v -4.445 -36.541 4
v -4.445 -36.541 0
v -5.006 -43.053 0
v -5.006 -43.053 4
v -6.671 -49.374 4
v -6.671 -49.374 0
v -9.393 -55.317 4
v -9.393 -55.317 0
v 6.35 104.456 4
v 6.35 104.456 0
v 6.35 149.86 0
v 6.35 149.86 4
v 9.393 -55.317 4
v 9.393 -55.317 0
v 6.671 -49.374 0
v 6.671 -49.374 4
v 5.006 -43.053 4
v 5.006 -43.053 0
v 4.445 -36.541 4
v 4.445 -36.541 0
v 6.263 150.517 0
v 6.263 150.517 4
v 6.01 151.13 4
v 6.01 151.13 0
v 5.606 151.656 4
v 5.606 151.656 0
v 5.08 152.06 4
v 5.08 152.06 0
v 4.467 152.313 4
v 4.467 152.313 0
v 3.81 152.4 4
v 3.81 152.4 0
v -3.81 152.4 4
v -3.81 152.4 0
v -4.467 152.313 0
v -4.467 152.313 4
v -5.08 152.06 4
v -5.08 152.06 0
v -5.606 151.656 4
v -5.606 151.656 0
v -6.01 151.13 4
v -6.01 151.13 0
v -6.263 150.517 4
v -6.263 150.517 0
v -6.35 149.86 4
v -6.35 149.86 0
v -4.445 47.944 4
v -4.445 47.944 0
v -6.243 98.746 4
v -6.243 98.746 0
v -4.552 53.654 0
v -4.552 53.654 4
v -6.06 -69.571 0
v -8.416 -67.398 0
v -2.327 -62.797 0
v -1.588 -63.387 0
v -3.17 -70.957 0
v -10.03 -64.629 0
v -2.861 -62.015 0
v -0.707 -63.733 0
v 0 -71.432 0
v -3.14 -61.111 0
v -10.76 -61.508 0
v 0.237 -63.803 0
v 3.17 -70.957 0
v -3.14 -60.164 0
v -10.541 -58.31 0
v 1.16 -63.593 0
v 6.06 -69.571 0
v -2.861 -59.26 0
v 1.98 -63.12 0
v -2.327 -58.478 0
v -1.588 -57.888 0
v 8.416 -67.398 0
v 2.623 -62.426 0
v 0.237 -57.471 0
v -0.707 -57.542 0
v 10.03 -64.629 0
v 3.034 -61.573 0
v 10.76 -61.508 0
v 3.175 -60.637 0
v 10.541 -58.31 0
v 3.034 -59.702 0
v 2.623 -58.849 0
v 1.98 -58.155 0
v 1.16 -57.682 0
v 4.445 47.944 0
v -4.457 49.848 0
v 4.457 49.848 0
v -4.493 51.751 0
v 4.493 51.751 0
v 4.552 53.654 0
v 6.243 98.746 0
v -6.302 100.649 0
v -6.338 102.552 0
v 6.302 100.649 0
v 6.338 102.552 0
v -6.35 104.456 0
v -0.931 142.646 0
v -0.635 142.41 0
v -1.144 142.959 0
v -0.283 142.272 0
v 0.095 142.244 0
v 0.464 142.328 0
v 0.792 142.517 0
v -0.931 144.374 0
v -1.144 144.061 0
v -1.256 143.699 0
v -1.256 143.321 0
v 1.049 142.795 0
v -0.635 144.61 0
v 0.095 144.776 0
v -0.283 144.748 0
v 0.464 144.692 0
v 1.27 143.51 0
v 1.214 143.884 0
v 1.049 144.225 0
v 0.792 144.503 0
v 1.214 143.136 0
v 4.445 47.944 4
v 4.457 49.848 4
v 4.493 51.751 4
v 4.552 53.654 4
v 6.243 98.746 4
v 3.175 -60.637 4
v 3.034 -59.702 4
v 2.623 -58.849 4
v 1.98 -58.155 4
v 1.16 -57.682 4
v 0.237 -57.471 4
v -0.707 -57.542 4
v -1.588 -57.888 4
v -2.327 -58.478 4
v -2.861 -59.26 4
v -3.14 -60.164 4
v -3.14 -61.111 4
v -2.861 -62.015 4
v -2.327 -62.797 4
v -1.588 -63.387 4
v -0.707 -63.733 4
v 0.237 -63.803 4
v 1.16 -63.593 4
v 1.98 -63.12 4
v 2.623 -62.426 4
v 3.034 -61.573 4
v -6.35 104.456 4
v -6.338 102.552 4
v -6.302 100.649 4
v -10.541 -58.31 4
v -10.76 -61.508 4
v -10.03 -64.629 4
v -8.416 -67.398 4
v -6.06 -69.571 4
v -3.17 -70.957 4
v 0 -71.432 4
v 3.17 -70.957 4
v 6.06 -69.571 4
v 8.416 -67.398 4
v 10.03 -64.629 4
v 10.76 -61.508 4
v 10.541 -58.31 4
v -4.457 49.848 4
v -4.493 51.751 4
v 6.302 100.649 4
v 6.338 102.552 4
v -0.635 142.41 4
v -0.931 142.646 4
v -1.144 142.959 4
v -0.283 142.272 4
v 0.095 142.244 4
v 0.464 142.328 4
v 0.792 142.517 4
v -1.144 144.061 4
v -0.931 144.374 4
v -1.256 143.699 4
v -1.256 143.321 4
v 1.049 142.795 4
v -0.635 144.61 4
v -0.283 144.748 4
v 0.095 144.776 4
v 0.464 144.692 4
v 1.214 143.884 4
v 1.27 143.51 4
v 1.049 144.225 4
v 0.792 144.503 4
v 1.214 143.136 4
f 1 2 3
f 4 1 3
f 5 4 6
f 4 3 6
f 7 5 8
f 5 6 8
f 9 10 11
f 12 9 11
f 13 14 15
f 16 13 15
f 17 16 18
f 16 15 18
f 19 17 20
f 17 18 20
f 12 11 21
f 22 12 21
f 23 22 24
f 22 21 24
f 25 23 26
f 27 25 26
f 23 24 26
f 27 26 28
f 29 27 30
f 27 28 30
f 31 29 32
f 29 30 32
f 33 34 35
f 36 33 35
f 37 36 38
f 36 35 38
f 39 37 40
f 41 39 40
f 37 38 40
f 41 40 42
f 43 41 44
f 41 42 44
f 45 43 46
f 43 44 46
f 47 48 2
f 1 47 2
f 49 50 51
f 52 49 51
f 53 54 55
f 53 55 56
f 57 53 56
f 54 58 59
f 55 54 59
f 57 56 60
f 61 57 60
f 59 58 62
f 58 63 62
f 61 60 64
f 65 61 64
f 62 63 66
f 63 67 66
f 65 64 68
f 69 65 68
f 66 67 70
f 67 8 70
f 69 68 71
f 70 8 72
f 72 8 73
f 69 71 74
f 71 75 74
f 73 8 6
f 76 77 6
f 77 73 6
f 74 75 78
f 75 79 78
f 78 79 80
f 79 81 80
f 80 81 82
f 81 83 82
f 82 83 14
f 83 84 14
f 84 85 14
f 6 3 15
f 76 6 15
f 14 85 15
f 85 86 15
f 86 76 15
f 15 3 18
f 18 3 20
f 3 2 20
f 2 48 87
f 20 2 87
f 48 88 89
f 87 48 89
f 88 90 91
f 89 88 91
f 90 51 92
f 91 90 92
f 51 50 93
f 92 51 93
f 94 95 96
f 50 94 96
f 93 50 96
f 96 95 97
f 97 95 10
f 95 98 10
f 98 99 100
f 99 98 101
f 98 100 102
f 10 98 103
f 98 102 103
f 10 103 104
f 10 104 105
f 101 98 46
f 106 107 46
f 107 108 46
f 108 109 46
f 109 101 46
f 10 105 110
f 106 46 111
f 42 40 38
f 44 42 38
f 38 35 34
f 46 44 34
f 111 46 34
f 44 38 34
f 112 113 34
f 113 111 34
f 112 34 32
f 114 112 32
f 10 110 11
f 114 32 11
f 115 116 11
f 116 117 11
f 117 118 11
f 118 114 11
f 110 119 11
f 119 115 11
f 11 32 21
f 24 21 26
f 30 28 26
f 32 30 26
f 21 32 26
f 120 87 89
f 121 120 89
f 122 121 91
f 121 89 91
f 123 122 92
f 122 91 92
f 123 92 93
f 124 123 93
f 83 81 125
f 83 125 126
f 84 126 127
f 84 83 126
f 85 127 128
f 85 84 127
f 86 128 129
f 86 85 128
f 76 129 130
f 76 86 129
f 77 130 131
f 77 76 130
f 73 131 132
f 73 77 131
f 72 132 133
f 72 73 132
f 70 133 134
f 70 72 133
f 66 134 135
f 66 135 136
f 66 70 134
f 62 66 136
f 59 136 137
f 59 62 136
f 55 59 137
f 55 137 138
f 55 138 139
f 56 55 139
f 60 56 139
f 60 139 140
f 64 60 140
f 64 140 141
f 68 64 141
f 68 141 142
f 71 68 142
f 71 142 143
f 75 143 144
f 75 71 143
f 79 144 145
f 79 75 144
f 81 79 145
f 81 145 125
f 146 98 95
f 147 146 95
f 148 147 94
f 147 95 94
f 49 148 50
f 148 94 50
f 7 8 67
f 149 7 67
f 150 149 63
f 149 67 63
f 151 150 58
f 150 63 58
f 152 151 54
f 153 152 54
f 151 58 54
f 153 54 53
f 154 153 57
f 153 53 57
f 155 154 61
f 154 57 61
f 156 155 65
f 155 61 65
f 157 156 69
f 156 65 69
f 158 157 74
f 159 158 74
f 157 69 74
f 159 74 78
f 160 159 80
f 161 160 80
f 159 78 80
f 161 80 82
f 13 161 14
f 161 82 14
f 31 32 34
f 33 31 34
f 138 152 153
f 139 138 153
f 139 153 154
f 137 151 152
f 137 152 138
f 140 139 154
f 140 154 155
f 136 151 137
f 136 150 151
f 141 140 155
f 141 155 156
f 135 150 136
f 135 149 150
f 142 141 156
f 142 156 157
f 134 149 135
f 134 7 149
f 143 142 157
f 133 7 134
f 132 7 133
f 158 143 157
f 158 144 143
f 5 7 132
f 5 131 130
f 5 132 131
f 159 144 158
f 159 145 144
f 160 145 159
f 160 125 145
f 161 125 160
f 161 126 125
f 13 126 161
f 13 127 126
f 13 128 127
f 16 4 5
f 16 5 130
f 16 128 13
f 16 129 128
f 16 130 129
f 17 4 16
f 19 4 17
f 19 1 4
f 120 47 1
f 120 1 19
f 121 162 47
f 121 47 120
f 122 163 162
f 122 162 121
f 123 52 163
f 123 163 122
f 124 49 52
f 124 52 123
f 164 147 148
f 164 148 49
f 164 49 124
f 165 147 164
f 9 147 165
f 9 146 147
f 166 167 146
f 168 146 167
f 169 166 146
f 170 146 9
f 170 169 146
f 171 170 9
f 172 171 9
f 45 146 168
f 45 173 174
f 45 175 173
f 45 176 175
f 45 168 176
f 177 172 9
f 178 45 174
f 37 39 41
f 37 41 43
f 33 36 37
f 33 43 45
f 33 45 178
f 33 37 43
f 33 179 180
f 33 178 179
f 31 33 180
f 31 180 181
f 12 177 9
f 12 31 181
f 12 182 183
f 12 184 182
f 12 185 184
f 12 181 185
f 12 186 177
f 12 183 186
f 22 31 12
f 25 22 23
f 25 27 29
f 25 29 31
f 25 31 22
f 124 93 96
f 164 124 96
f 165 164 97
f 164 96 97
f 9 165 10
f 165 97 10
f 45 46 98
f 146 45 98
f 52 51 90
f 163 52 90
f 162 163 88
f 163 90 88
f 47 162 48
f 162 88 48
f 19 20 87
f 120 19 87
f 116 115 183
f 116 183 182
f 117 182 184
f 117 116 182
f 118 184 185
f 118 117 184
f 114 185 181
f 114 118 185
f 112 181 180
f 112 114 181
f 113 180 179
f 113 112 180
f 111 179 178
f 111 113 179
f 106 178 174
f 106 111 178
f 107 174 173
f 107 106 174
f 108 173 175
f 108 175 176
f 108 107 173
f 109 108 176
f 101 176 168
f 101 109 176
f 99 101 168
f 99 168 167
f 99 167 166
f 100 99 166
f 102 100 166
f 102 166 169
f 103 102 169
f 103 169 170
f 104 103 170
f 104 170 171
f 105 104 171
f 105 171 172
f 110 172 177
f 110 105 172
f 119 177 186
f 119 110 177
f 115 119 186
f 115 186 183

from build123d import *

# Parameters (mm, degrees)
SKETCH2_R           = 1.27
SKETCH2_R_2         = 3.175
BOSS_EXTRUDE1_DEPTH = 4


with BuildPart() as part:
    # Sketch2 → Boss-Extrude1 (new body)
    with BuildSketch(Plane.XY):
        with BuildLine():
            Line((4.552043366, 53.654489758), (6.242956634, 98.745510242))
            ThreePointArc((6.242956634, 98.745510242), (6.323236809, 101.600501634), (6.35, 104.456496116))
            Line((6.35, 104.456496116), (6.35, 149.86))
            ThreePointArc((6.35, 149.86), (5.606051224, 151.656051224), (3.81, 152.4))
            Line((3.81, 152.4), (-3.81, 152.4))
            ThreePointArc((-3.81, 152.4), (-5.606051224, 151.656051224), (-6.35, 149.86))
            Line((-6.35, 149.86), (-6.35, 104.456496116))
            ThreePointArc((-6.35, 104.456496116), (-6.323236809, 101.600501634), (-6.242956634, 98.745510242))
            Line((-6.242956634, 98.745510242), (-4.552043366, 53.654489758))
            ThreePointArc((-4.552043366, 53.654489758), (-4.471763191, 50.799498366), (-4.445, 47.943503884))
            Line((-4.445, 47.943503884), (-4.445, -36.540821929))
            ThreePointArc((-4.445, -36.540821929), (-5.702774085, -46.249600926), (-9.393051948, -55.317358893))
            ThreePointArc((-9.393051948, -55.317358893), (0, -71.432377699), (9.393051948, -55.317358893))
            ThreePointArc((9.393051948, -55.317358893), (5.702774085, -46.249600926), (4.445, -36.540821929))
            Line((4.445, -36.540821929), (4.445, 47.943503884))
            ThreePointArc((4.445, 47.943503884), (4.471763191, 50.799498366), (4.552043366, 53.654489758))
        make_face()
        with Locations((0, 143.51)):
            Circle(SKETCH2_R, mode=Mode.SUBTRACT)
        with Locations((0, -60.637377699)):
            Circle(SKETCH2_R_2, mode=Mode.SUBTRACT)
    extrude(amount=BOSS_EXTRUDE1_DEPTH)


solid = part.part
